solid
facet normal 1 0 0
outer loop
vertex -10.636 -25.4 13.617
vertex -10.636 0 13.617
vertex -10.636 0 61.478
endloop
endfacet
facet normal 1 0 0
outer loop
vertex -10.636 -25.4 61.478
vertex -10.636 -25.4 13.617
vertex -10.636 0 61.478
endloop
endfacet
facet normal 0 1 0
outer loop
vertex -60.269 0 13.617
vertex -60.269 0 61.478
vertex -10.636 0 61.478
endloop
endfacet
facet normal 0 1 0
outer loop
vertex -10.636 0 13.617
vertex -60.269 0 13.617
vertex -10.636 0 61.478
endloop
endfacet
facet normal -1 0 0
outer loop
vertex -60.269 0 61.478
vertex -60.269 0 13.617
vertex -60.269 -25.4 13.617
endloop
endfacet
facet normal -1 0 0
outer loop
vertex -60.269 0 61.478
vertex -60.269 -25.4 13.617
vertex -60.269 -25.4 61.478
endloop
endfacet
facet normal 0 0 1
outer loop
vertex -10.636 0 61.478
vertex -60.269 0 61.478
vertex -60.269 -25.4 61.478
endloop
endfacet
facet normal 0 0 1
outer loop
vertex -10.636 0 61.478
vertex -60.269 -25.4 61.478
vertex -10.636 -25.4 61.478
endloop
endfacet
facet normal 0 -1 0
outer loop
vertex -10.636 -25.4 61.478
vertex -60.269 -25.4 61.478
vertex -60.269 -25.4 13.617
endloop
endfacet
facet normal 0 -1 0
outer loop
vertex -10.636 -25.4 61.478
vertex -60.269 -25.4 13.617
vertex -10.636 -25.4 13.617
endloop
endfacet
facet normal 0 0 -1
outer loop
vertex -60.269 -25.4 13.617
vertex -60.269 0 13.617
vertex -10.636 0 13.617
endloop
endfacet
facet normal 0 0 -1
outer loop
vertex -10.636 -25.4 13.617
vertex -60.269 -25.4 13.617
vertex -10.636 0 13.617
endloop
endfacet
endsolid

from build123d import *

# Parameters (mm, degrees)
F0_W      = 49.633597
F0_H      = 47.860969
F1_DEPTH  = 25.4
F2_W      = 27.072871
F2_H      = 22.077278
F3_DEPTH  = 25.4
F1_FACE_W = 49.633598
F1_FACE_H = 47.860968
F4_DEPTH  = 25.4


with BuildPart() as f1:
    # F0 (on Front) → F1 (new body)
    with BuildSketch(Plane.XZ):
        with Locations((-35.452568, 37.547494)):
            Rectangle(F0_W, F0_H)
    extrude(amount=F1_DEPTH)

    # F2 (on face) → F3 (join)
    with BuildSketch(Plane.XZ.offset(25.4)):
        with Locations((-39.158972, 40.609304)):
            Rectangle(F2_W, F2_H)
    extrude(amount=-F3_DEPTH)

    # F1_face (on face) → F4 (cut)
    with BuildSketch(Plane(origin=(-35.452568, -25.4, 37.547493), x_dir=(1, 0, 0), z_dir=(0, -1, 0))):
        Rectangle(F1_FACE_W, F1_FACE_H)
    extrude(amount=F4_DEPTH, mode=Mode.SUBTRACT)


solid = f1.part
